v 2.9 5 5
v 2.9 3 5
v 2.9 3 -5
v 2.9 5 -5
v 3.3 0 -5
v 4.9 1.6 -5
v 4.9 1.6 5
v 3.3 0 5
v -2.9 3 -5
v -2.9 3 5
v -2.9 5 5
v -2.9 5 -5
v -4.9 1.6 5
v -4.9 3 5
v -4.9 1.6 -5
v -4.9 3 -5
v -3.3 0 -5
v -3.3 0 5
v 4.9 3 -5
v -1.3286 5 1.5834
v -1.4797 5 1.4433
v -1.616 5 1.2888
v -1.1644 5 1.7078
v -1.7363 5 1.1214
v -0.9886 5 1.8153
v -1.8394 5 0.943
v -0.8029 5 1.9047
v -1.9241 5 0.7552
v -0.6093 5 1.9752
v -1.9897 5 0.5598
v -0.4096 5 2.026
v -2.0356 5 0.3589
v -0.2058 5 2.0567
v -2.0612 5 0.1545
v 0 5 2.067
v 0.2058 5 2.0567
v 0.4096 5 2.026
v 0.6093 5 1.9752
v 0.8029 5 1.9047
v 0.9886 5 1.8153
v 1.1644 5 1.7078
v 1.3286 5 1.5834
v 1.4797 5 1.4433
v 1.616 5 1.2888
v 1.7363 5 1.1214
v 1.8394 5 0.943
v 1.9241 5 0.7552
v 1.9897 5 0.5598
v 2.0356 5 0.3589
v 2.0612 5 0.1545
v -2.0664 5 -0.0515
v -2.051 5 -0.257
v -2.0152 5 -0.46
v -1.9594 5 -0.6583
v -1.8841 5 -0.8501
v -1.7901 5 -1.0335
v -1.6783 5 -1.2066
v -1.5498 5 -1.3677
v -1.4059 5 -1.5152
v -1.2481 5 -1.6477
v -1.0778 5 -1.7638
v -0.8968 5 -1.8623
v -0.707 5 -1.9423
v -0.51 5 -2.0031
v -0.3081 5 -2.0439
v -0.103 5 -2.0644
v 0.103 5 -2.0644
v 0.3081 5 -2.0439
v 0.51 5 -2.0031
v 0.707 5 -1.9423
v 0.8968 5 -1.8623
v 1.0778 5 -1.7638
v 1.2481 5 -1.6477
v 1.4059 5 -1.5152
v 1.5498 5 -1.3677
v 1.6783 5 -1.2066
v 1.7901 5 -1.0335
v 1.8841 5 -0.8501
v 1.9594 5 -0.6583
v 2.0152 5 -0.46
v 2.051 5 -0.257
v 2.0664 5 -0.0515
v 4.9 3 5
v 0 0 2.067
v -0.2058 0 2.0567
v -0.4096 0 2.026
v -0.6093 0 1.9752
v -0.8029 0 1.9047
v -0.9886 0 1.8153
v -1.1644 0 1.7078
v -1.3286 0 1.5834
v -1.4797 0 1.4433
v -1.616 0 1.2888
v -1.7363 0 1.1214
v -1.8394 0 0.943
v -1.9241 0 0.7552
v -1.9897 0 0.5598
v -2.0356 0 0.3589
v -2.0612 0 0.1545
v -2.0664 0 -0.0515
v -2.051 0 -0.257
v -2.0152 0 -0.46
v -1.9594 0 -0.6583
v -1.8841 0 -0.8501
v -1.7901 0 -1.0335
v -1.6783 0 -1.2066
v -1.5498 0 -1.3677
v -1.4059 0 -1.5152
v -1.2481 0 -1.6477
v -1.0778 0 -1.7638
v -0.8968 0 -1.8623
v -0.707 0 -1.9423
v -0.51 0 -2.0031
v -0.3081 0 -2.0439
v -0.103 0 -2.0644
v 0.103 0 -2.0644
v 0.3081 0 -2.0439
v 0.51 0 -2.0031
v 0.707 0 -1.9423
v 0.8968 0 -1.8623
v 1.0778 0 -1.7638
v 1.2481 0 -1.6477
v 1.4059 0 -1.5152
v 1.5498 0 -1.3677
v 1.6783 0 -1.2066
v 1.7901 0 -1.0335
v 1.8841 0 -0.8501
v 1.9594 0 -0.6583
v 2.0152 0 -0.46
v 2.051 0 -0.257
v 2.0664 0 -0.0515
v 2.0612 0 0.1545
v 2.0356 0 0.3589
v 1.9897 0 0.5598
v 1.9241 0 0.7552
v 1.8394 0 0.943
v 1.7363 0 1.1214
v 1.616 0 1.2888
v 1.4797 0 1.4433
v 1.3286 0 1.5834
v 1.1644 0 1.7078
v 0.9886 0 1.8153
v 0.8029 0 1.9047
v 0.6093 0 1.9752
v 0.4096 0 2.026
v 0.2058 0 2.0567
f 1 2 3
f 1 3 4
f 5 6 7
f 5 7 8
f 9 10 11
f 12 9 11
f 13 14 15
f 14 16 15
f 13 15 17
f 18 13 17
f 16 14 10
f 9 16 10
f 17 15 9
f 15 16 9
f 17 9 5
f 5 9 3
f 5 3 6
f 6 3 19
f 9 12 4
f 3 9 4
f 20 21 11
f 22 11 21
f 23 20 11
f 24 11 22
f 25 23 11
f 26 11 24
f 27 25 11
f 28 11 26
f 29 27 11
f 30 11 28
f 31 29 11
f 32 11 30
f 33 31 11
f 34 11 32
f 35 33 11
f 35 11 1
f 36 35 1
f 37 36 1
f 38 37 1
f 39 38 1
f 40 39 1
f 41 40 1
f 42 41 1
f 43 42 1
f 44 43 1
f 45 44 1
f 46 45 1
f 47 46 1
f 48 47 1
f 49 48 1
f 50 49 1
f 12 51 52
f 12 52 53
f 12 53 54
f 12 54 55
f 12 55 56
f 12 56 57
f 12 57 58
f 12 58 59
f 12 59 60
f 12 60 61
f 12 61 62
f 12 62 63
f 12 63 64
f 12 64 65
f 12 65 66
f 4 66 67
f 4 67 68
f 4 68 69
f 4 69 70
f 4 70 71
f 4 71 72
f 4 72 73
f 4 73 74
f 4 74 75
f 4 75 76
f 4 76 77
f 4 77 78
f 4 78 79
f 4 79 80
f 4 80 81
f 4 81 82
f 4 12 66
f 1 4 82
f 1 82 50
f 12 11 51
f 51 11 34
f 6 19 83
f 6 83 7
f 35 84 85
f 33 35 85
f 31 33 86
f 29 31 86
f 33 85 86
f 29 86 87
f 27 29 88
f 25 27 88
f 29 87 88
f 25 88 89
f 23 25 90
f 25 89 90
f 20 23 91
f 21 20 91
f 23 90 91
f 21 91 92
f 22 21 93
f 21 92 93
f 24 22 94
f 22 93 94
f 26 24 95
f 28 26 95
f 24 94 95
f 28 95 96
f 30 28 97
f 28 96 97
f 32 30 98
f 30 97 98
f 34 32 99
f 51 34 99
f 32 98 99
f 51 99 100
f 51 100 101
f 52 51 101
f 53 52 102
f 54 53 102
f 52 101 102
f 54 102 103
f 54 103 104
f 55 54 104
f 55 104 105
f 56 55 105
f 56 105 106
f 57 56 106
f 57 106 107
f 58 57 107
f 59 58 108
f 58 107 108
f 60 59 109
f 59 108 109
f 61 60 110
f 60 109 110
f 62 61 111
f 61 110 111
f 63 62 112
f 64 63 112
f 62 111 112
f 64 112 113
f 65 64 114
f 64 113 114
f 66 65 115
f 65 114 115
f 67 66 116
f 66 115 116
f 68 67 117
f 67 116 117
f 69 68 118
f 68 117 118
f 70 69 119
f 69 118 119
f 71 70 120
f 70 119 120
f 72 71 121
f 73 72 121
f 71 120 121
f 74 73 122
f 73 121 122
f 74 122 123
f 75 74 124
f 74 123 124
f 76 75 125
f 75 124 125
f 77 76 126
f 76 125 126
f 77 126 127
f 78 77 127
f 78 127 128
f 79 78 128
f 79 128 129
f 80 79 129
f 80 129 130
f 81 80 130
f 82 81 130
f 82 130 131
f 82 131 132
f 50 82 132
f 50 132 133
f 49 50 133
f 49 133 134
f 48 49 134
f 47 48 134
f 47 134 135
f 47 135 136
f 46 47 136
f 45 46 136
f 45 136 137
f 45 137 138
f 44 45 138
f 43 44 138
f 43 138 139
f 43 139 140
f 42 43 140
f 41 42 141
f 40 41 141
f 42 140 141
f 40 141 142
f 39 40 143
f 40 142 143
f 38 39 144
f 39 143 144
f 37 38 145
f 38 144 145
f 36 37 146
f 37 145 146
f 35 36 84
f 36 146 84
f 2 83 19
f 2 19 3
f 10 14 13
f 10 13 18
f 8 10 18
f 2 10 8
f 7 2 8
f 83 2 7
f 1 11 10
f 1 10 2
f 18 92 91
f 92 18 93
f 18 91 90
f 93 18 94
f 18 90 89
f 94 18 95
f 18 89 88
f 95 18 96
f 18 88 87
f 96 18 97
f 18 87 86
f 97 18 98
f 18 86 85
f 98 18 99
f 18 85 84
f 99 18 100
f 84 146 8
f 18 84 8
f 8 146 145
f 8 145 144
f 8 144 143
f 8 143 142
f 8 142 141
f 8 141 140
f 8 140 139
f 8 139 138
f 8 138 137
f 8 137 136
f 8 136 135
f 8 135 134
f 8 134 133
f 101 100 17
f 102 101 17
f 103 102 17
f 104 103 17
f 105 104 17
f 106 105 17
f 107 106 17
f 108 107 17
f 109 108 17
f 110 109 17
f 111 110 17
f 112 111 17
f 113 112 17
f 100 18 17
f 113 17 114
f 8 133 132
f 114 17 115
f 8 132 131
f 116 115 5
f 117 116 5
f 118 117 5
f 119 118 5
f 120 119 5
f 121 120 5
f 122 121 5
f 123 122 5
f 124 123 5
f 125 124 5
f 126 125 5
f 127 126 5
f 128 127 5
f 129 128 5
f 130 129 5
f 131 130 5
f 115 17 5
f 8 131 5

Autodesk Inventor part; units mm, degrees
ref_plane "YZ Plane" through (0, 0, 0) normal (1, 0, 0) x (0, 1, 0)
ref_plane "XZ Plane" through (0, 0, 0) normal (0, 1, 0) x (-1, 0, 0)
ref_plane "XY Plane" through (0, 0, 0) normal (0, 0, 1) x (1, 0, 0)
sketch "Эскиз2" plane through (0, 0, 0) normal (0, 0, 1) x (1, 0, 0)
  line L0 (-4.9, 3) -> (-4.9, 1.6)
  line L1 (-4.9, 1.6) -> (-3.3, 0)
  line L2 (-3.3, 0) -> (0, 0)
  line L3 (-4.9, 3) -> (-2.9, 3)
  line L4 (-2.9, 3) -> (-2.9, 5)
  line L5 (-2.9, 5) -> (0, 5)
  line L6 (-6.86, 0) -> (6.86, 0) projected
  line L7 (0, -1) -> (0, 6) projected
  line L8 (4.9, 3) -> (4.9, 1.6)
  line L9 (4.9, 1.6) -> (3.3, 0)
  line L10 (3.3, 0) -> (0, 0)
  line L11 (4.9, 3) -> (2.9, 3)
  line L12 (2.9, 3) -> (2.9, 5)
  line L13 (2.9, 5) -> (0, 5)
  point P0 (3.3, 0)
  dimension "d0" = 2
  dimension "d1" = 1.4
  dimension "d3" = 9.8
  dimension "d4" = 5.8
  dimension "d5" = 5
  dimension "d18" = 6.6
extrude "Выдавливание1" add sketch "Эскиз2" along normal mid plane 10
sketch "Эскиз3" plane through (-2.9, 5, 5) normal (0, 1, 0) x (1, 0, 0)
  point P0 (2.9, 5)
  point P1 (2.9, 5)
hole "Отверстие1" at (0, 5, 0) direction (0, -1, 0) diameter 4.134 end through all thread size "M5x0.8" class "6H" standard "ISO Metric profile"
properties part number "гайка T-паза m6"
